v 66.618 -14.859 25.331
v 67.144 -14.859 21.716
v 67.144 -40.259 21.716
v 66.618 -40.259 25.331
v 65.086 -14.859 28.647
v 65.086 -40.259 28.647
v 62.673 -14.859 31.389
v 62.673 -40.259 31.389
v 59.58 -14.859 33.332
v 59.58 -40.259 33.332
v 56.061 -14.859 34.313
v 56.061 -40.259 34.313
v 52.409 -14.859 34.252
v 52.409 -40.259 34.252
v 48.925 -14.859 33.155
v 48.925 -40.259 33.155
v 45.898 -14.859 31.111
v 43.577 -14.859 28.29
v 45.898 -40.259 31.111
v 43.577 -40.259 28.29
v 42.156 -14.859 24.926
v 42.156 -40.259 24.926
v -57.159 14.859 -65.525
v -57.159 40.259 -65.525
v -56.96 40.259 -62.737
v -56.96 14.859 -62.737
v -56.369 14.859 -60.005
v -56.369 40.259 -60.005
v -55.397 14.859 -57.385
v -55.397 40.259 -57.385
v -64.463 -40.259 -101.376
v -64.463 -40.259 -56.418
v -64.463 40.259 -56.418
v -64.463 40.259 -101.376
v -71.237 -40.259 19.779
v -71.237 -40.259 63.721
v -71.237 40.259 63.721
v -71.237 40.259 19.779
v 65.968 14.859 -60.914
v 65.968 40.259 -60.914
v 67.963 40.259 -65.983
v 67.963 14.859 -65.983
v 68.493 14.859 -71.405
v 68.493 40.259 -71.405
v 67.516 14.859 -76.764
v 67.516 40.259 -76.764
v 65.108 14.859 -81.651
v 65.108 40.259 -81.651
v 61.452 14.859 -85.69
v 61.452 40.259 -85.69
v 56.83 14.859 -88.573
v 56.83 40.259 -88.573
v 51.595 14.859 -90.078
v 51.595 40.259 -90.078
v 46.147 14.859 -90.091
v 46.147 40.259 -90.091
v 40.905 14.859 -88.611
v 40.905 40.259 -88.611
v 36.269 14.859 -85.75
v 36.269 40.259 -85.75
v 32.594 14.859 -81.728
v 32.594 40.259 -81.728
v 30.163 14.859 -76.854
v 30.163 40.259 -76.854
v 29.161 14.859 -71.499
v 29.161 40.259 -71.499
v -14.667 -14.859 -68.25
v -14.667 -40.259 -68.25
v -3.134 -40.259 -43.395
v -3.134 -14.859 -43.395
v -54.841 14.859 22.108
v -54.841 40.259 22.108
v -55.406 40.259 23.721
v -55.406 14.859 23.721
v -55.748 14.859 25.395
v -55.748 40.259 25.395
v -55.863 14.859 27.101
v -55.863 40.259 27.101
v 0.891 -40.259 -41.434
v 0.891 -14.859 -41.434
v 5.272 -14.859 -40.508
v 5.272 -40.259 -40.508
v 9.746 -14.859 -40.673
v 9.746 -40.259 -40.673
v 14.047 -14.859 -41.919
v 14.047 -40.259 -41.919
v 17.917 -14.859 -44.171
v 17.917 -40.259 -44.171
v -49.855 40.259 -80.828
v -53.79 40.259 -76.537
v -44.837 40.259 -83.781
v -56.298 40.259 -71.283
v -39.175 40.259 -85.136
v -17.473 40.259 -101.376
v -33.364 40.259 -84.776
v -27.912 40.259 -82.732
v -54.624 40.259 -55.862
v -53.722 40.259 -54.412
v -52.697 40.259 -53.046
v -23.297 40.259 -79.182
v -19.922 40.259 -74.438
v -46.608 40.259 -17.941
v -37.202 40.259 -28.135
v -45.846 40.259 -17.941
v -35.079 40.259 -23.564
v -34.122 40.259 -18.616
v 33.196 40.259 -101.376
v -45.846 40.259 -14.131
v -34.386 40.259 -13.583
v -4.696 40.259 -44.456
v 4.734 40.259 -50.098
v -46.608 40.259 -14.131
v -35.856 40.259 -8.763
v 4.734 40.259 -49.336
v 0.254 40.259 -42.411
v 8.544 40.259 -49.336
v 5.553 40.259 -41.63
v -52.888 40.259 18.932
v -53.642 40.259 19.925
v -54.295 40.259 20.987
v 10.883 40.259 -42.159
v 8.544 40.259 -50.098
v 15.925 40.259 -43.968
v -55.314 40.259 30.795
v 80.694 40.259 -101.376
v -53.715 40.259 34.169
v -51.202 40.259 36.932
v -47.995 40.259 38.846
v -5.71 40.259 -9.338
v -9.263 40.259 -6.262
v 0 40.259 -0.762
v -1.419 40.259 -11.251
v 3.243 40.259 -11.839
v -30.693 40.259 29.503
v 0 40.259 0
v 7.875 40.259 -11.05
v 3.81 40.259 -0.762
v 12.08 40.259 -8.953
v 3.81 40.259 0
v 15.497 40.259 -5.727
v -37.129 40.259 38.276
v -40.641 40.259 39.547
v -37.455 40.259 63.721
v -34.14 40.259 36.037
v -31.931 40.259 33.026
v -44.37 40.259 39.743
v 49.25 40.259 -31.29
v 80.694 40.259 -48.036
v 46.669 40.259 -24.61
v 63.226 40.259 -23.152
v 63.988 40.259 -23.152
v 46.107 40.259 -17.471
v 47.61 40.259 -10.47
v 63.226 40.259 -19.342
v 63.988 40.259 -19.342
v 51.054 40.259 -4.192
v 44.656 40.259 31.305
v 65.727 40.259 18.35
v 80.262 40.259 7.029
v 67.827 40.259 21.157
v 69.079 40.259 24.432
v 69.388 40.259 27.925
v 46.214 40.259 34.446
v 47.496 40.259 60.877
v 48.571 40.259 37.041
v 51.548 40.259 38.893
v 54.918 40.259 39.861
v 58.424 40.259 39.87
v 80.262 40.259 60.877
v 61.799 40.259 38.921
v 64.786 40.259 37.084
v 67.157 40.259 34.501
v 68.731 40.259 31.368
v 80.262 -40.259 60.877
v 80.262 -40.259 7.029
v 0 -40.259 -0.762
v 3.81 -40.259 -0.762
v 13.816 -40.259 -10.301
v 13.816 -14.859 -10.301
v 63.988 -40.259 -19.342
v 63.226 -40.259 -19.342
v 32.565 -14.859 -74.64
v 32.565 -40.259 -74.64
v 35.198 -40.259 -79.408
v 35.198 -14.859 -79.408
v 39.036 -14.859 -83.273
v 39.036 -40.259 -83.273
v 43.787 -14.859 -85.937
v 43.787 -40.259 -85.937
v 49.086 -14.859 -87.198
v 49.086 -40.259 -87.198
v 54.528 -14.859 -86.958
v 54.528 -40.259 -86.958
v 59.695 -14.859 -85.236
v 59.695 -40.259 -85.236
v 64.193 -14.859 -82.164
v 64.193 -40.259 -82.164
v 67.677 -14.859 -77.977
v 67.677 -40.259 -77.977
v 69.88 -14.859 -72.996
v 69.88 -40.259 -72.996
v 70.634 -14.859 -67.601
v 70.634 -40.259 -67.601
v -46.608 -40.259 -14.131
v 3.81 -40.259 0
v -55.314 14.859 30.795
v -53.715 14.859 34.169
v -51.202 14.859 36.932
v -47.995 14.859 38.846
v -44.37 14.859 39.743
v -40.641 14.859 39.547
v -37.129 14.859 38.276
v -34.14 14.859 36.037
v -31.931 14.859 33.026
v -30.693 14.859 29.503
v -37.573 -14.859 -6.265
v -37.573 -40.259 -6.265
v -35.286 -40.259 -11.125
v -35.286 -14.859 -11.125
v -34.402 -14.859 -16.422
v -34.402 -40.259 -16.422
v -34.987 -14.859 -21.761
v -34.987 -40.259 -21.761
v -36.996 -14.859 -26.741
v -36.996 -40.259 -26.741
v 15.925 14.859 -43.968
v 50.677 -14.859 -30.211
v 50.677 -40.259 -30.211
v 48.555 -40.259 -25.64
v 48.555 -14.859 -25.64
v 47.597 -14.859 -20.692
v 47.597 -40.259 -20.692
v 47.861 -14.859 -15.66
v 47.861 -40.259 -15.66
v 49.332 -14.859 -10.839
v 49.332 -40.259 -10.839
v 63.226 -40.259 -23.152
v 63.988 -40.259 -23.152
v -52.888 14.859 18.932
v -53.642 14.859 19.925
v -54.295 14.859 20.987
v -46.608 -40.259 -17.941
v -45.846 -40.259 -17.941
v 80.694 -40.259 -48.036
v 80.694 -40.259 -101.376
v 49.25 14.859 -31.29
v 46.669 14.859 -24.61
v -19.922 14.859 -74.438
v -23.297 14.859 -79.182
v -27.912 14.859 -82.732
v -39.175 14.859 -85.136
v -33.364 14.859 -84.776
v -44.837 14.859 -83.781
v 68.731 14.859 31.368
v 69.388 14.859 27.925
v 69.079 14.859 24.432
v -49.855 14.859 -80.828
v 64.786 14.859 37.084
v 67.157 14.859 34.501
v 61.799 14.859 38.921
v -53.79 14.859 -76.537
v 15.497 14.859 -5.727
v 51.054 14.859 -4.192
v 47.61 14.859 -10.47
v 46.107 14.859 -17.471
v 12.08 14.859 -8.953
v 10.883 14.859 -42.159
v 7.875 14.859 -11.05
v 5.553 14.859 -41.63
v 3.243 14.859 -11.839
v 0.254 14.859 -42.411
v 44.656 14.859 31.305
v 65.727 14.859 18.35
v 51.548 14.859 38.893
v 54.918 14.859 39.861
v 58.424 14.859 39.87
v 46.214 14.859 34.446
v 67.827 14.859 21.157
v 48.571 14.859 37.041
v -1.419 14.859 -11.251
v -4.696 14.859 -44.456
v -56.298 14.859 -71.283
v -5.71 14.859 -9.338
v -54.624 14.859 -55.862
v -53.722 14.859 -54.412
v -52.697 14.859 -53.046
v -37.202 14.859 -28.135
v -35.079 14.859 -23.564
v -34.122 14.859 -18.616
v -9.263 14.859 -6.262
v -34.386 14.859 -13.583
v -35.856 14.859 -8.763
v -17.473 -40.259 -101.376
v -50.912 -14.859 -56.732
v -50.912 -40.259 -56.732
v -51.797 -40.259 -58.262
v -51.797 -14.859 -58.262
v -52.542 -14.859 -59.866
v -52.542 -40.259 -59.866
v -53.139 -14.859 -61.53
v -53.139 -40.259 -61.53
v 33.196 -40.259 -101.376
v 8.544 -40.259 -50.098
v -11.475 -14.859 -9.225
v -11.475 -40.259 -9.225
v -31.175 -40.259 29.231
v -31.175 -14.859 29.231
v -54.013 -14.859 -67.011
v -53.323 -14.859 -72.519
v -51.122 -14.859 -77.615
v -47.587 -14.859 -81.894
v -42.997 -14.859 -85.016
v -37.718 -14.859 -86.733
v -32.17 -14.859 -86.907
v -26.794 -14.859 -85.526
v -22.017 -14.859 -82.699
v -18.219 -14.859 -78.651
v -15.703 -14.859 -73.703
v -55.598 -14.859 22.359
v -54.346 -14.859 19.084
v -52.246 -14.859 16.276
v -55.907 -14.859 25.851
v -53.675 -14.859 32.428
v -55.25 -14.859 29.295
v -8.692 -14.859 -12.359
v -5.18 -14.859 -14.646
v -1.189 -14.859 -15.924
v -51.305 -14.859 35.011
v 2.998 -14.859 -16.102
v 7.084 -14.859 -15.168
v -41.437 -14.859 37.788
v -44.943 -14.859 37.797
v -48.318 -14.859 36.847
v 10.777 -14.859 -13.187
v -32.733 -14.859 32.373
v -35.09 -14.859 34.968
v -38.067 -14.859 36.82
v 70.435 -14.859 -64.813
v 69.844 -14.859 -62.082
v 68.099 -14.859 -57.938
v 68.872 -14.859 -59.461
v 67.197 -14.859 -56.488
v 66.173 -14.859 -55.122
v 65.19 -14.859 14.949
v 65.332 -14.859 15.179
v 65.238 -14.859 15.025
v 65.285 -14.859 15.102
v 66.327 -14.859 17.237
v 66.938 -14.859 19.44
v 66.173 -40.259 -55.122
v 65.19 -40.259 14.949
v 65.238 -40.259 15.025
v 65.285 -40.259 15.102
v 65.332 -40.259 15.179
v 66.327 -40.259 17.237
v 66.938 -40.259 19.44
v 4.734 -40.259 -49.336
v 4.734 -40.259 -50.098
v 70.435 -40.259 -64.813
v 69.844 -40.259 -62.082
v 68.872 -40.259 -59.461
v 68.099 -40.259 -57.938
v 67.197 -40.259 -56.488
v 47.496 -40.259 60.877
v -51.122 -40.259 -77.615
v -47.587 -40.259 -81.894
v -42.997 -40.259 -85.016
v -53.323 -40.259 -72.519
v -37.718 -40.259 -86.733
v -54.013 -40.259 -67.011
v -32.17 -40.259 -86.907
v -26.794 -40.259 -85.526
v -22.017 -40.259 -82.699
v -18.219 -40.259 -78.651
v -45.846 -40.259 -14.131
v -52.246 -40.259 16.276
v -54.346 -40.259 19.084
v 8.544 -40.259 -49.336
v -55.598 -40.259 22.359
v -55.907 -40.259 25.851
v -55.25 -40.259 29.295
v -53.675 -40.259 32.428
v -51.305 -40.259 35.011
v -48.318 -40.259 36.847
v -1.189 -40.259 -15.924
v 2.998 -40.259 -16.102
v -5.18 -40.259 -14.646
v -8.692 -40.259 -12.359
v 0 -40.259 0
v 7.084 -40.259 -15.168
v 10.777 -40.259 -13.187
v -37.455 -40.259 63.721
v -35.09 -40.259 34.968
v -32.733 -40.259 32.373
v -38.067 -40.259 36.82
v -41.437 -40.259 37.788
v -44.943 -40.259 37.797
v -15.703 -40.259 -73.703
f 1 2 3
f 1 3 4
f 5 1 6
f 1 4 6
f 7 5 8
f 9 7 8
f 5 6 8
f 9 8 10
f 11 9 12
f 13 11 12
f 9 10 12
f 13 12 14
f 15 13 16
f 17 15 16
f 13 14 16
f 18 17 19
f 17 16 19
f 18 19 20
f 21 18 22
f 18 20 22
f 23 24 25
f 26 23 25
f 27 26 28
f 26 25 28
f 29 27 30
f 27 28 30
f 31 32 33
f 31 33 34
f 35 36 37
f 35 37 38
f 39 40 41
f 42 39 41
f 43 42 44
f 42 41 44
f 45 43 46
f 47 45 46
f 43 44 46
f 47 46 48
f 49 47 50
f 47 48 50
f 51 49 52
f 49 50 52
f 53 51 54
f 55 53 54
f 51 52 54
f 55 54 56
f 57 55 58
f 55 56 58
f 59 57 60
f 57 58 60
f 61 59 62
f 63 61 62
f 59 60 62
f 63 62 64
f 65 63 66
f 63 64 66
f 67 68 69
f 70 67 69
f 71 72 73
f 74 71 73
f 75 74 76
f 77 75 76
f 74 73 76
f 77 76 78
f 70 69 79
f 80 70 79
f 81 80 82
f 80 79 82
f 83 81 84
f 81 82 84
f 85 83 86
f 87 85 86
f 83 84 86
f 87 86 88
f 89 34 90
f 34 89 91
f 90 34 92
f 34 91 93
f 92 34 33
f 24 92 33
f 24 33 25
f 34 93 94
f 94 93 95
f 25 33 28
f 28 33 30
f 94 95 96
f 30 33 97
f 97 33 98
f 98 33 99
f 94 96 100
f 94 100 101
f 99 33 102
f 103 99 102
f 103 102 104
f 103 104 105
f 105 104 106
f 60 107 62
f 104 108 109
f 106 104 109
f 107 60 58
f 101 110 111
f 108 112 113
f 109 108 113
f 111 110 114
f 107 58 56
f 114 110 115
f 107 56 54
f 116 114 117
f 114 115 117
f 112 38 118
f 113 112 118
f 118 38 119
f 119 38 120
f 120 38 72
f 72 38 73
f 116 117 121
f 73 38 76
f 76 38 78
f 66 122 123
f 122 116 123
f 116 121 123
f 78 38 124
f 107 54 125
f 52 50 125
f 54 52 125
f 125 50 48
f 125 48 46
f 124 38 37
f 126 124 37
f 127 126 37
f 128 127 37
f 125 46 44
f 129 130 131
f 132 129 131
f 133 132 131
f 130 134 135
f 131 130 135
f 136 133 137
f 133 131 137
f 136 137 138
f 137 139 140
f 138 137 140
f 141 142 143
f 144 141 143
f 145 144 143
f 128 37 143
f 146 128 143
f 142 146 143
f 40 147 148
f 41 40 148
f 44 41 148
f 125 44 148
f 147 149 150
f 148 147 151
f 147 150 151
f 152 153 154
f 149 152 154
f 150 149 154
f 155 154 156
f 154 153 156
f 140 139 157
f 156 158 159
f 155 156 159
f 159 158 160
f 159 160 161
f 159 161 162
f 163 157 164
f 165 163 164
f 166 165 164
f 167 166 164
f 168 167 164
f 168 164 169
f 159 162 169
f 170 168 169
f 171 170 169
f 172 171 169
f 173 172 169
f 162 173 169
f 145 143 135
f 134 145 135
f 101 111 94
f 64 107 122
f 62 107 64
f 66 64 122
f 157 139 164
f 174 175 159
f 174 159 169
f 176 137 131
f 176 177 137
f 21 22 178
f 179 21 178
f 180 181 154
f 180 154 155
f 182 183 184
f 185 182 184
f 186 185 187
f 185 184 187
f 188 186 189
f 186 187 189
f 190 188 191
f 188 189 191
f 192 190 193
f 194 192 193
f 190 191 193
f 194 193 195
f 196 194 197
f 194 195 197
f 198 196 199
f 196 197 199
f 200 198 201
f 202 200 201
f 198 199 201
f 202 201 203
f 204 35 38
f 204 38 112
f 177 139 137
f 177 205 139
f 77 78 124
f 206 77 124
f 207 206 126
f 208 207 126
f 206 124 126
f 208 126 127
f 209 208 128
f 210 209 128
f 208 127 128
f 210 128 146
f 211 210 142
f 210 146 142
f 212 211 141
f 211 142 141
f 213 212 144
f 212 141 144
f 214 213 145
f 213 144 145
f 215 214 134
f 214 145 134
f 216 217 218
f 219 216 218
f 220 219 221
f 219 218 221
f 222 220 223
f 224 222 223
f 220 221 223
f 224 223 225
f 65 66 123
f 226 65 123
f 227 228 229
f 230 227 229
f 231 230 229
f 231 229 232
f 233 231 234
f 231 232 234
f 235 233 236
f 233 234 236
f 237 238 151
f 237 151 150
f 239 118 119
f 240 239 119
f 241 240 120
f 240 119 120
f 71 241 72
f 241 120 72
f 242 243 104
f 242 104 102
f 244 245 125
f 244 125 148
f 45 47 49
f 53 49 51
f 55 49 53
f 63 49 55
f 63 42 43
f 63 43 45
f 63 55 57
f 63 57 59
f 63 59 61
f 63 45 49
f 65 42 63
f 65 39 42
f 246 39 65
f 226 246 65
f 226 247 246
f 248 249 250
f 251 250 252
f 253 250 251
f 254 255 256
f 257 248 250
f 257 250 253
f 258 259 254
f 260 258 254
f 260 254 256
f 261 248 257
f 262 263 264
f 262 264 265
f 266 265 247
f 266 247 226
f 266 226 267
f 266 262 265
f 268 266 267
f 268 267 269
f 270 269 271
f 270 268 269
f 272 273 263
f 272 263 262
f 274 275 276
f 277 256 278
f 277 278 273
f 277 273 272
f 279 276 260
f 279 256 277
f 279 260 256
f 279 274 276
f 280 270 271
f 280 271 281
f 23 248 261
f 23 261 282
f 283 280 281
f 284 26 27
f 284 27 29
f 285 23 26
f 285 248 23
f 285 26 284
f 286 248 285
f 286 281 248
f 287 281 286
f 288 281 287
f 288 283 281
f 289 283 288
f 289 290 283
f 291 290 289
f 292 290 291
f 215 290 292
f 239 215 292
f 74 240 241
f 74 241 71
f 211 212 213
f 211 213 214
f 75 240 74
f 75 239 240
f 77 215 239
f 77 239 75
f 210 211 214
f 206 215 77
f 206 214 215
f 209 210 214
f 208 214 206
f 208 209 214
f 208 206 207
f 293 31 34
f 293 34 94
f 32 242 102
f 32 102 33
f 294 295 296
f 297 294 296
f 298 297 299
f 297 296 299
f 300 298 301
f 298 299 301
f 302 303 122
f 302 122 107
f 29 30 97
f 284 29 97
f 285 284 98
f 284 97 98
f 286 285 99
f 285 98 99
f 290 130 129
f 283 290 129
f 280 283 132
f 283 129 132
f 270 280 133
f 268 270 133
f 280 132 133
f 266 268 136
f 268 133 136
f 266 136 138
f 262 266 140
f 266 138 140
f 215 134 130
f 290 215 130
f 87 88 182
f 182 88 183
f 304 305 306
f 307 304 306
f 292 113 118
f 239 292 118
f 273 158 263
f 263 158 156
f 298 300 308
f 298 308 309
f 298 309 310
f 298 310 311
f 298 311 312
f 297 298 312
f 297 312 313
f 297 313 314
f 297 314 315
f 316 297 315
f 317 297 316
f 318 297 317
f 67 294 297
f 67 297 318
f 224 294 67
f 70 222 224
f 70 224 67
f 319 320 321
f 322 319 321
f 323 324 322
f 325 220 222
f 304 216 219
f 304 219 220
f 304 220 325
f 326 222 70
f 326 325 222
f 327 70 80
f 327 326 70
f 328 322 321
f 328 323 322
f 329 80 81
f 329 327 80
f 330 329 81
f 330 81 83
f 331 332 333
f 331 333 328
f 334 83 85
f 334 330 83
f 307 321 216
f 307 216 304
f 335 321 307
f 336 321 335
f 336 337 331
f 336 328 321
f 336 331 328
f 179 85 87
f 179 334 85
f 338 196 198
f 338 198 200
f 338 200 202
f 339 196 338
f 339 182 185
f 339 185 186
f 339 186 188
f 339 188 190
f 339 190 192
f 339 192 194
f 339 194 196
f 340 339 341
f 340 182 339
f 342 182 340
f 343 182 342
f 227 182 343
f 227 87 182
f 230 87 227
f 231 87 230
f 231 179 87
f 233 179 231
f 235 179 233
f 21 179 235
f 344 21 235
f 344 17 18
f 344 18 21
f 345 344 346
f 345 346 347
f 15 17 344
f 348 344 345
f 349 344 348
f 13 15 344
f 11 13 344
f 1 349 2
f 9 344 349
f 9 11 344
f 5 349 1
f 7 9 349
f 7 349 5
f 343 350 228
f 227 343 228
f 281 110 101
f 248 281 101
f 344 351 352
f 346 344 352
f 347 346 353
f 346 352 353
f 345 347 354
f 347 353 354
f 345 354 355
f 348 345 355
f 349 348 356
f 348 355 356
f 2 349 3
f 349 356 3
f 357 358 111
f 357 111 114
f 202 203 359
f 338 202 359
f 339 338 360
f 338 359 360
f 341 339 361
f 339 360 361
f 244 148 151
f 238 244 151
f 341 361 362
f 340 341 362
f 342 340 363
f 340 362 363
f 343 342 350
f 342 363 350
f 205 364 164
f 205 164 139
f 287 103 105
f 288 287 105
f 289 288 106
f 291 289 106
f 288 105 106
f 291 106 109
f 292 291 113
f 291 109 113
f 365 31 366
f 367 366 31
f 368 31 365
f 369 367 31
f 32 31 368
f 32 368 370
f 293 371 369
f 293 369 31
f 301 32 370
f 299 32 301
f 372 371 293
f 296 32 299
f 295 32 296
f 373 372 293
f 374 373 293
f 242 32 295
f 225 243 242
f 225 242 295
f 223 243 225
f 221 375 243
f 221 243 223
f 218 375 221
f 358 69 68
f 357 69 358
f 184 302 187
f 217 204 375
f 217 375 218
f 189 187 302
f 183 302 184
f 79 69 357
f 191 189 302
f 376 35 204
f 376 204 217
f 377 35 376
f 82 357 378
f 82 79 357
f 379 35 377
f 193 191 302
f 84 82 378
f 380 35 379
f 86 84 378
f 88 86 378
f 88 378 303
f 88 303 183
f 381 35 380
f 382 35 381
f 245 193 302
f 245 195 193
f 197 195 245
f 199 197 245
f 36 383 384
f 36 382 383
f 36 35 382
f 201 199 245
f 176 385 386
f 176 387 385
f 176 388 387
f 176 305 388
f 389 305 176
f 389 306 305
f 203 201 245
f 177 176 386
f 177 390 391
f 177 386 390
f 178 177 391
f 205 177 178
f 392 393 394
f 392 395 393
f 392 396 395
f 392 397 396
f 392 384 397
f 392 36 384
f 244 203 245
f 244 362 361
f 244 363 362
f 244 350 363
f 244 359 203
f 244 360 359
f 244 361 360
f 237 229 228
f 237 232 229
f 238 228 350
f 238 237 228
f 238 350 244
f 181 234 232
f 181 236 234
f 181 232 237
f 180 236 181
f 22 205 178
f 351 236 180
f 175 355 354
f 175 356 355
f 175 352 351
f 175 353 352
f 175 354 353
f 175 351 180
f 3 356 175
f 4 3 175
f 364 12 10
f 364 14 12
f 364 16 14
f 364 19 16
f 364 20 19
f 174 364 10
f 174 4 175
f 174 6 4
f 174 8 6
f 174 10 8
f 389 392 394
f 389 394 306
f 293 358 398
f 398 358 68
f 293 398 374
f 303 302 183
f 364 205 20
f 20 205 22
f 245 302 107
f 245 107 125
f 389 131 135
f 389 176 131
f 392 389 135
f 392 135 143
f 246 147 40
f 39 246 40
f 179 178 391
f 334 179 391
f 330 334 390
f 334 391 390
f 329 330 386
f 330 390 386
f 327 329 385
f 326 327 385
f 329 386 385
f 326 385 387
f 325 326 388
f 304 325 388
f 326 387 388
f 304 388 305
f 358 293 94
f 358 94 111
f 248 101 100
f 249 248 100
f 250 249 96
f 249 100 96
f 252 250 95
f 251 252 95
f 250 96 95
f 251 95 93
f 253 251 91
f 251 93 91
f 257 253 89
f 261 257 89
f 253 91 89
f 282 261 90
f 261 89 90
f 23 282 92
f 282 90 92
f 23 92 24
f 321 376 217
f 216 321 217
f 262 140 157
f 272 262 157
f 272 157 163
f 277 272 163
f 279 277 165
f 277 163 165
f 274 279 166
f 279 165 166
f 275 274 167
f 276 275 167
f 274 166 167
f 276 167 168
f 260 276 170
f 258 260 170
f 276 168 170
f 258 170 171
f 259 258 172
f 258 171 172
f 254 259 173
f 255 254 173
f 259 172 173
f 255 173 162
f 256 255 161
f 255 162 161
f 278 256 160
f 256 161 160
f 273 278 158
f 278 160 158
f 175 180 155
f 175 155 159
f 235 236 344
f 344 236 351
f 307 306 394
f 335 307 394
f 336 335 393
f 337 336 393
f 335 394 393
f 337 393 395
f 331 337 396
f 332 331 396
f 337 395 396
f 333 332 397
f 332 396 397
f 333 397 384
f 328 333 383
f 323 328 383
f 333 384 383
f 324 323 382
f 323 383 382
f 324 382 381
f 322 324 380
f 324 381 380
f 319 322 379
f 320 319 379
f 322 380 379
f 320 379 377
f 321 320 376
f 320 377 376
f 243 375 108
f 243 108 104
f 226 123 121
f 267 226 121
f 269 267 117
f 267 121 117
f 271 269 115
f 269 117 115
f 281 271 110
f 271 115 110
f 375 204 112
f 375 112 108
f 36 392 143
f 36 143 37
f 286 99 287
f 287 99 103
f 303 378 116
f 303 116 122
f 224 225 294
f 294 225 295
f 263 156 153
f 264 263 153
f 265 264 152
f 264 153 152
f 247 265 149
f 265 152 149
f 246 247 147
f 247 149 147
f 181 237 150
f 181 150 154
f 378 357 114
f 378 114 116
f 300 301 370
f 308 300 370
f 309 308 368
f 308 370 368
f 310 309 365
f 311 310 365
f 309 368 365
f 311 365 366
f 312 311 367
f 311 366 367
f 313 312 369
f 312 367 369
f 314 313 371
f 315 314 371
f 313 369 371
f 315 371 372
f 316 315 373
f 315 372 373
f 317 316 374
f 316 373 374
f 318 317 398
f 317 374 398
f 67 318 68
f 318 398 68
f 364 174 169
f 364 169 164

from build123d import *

# Parameters (mm, degrees)
F1_DEPTH = 40.259
F3_DEPTH = 25.4
F5_DEPTH = 25.4


with BuildPart() as f1:
    # F0 (on Front) → F1 (new body, symmetric)
    with BuildSketch(Plane.XZ):
        Polygon((0, -0.762), (0, 0), (-37.454836, 63.721383), (-71.236836, 63.721383), (-71.236836, 19.779383), (-46.608452, -14.130657), (-45.846452, -14.130657), (-45.846452, -17.940657), (-46.608452, -17.940657), (-64.46274, -56.418067), (-64.46274, -101.376067), (-17.47274, -101.376067), (4.734051, -50.098072), (4.734051, -49.336072), (8.544051, -49.336072), (8.544051, -50.098072), (33.19607, -101.376067), (80.69407, -101.376067), (80.69407, -48.036067), (63.988247, -23.151609), (63.226247, -23.151609), (63.226247, -19.341609), (63.988247, -19.341609), (80.262104, 7.029165), (80.262104, 60.877165), (47.496104, 60.877165), (3.81, 0), (3.81, -0.762), align=None)
    extrude(amount=F1_DEPTH, both=True)

    # F2 (on face) → F3 (cut)
    with BuildSketch(Plane.XZ.offset(40.259)):
        with BuildLine():
            ThreePointArc((-52.245846, 16.276482), (-38.390892, 13.469409), (-30.523199, 25.214145))
            ThreePointArc((-30.523199, 25.214145), (-30.687283, 27.249046), (-31.175296, 29.231365))
            ThreePointArc((-31.175296, 29.231365), (-49.874912, 36.032865), (-52.245846, 16.276482))
        make_face()
        with BuildLine():
            ThreePointArc((-31.175296, 29.231365), (-30.687283, 27.249046), (-30.523199, 25.214145))
            ThreePointArc((-30.523199, 25.214145), (-38.390892, 13.469409), (-52.245846, 16.276482))
            Line((-52.245846, 16.276482), (-37.573051, -6.265247))
            ThreePointArc((-37.573051, -6.265247), (-34.402313, -16.422015), (-36.996162, -26.741195))
            Line((-36.996162, -26.741195), (-50.912392, -56.731777))
            ThreePointArc((-50.912392, -56.731777), (-28.804068, -48.448298), (-14.646231, -67.34141))
            ThreePointArc((-14.646231, -67.34141), (-14.651472, -67.795631), (-14.667193, -68.249609))
            Line((-14.667193, -68.249609), (-3.134057, -43.394785))
            ThreePointArc((-3.134057, -43.394785), (7.514222, -40.45337), (17.917042, -44.17078))
            Line((17.917042, -44.17078), (32.565061, -74.639729))
            ThreePointArc((32.565061, -74.639729), (41.062727, -50.578546), (66.172654, -55.121942))
            Line((66.172654, -55.121942), (50.676871, -30.211112))
            ThreePointArc((50.676871, -30.211112), (47.597224, -20.692297), (49.331598, -10.839176))
            Line((49.331598, -10.839176), (65.190411, 14.949097))
            ThreePointArc((65.190411, 14.949097), (49.396243, 10.062519), (42.155779, 24.925563))
            Line((42.155779, 24.925563), (13.816384, -10.301067))
            ThreePointArc((13.816384, -10.301067), (0.898878, -16.153519), (-11.474751, -9.224849))
            Line((-11.474751, -9.224849), (-31.175296, 29.231365))
        make_face()
        with BuildLine():
            ThreePointArc((67.143639, 21.716436), (56.06138, 34.31298), (42.155779, 24.925563))
            ThreePointArc((42.155779, 24.925563), (49.396243, 10.062519), (65.190411, 14.949097))
            Line((65.190411, 14.949097), (65.331844, 15.179083))
            ThreePointArc((65.331844, 15.179083), (66.682311, 18.324549), (67.143639, 21.716436))
        make_face()
        with BuildLine():
            Line((-53.138839, -61.529947), (-50.912392, -56.731777))
            ThreePointArc((-50.912392, -56.731777), (-52.187514, -59.055738), (-53.138839, -61.529947))
        make_face()
        with BuildLine():
            ThreePointArc((-14.646231, -67.34141), (-28.804068, -48.448298), (-50.912392, -56.731777))
            Line((-50.912392, -56.731777), (-53.138839, -61.529947))
            ThreePointArc((-53.138839, -61.529947), (-37.718241, -86.732836), (-14.667193, -68.249609))
            ThreePointArc((-14.667193, -68.249609), (-14.651472, -67.795631), (-14.646231, -67.34141))
        make_face()
        with BuildLine():
            Line((65.331844, 15.179083), (65.190411, 14.949097))
            ThreePointArc((65.190411, 14.949097), (65.261739, 15.063714), (65.331844, 15.179083))
        make_face()
        with BuildLine():
            Line((68.871818, -59.461086), (66.172654, -55.121942))
            ThreePointArc((66.172654, -55.121942), (41.062727, -50.578546), (32.565061, -74.639729))
            ThreePointArc((32.565061, -74.639729), (54.527629, -86.95802), (70.633667, -67.601103))
            ThreePointArc((70.633667, -67.601103), (70.188163, -63.43685), (68.871818, -59.461086))
        make_face()
        with BuildLine():
            ThreePointArc((68.871818, -59.461086), (67.663637, -57.203555), (66.172654, -55.121942))
            Line((66.172654, -55.121942), (68.871818, -59.461086))
        make_face()
    extrude(amount=-F3_DEPTH, mode=Mode.SUBTRACT)

    # F4 (on face) → F5 (cut)
    with BuildSketch(Plane(origin=(0, 40.259, 0), x_dir=(-1, 0, 0), z_dir=(0, 1, 0))):
        with BuildLine():
            ThreePointArc((-65.726989, 18.3497), (-51.872034, 15.542628), (-44.004341, 27.287363))
            ThreePointArc((-44.004341, 27.287363), (-44.168425, 29.322264), (-44.656439, 31.304583))
            ThreePointArc((-44.656439, 31.304583), (-63.356054, 38.106083), (-65.726989, 18.3497))
        make_face()
        with BuildLine():
            ThreePointArc((-44.656439, 31.304583), (-44.168425, 29.322264), (-44.004341, 27.287363))
            ThreePointArc((-44.004341, 27.287363), (-51.872034, 15.542628), (-65.726989, 18.3497))
            Line((-65.726989, 18.3497), (-51.054193, -4.192029))
            ThreePointArc((-51.054193, -4.192029), (-46.106839, -17.471409), (-49.249755, -31.289525))
            Line((-49.249755, -31.289525), (-65.967989, -60.914299))
            ThreePointArc((-65.967989, -60.914299), (-43.823018, -51.54992), (-29.139468, -70.588952))
            ThreePointArc((-29.139468, -70.588952), (-29.144731, -71.044099), (-29.160516, -71.499002))
            Line((-29.160516, -71.499002), (-15.92485, -43.967853))
            ThreePointArc((-15.92485, -43.967853), (-5.553349, -41.629648), (4.695866, -44.456098))
            Line((4.695866, -44.456098), (19.922124, -74.438221))
            ThreePointArc((19.922124, -74.438221), (26.714122, -49.040464), (52.697492, -53.045686))
            Line((52.697492, -53.045686), (37.20171, -28.134856))
            ThreePointArc((37.20171, -28.134856), (34.122063, -18.616042), (35.856437, -8.762921))
            Line((35.856437, -8.762921), (52.887628, 18.931776))
            ThreePointArc((52.887628, 18.931776), (37.702376, 15.634645), (30.692658, 29.502839))
            Line((30.692658, 29.502839), (9.262503, -6.26221))
            ThreePointArc((9.262503, -6.26221), (-3.243304, -11.839034), (-15.496504, -5.727138))
            Line((-15.496504, -5.727138), (-44.656439, 31.304583))
        make_face()
        with BuildLine():
            ThreePointArc((55.863387, 27.100566), (44.369981, 39.743119), (30.692658, 29.502839))
            ThreePointArc((30.692658, 29.502839), (37.702376, 15.634645), (52.887628, 18.931776))
            Line((52.887628, 18.931776), (54.840929, 22.10807))
            ThreePointArc((54.840929, 22.10807), (55.605147, 24.552506), (55.863387, 27.100566))
        make_face()
        with BuildLine():
            ThreePointArc((-29.139468, -70.588952), (-43.823018, -51.54992), (-65.967989, -60.914299))
            ThreePointArc((-65.967989, -60.914299), (-54.264793, -89.507252), (-29.160516, -71.499002))
            ThreePointArc((-29.160516, -71.499002), (-29.144731, -71.044099), (-29.139468, -70.588952))
        make_face()
        with BuildLine():
            Line((54.840929, 22.10807), (52.887628, 18.931776))
            ThreePointArc((52.887628, 18.931776), (53.981487, 20.447844), (54.840929, 22.10807))
        make_face()
        with BuildLine():
            Line((55.396657, -57.38483), (52.697492, -53.045686))
            ThreePointArc((52.697492, -53.045686), (26.714122, -49.040464), (19.922124, -74.438221))
            ThreePointArc((19.922124, -74.438221), (42.056096, -84.669013), (57.158505, -65.524847))
            ThreePointArc((57.158505, -65.524847), (56.713002, -61.360595), (55.396657, -57.38483))
        make_face()
        with BuildLine():
            ThreePointArc((55.396657, -57.38483), (54.188476, -55.1273), (52.697492, -53.045686))
            Line((52.697492, -53.045686), (55.396657, -57.38483))
        make_face()
    extrude(amount=-F5_DEPTH, mode=Mode.SUBTRACT)


solid = f1.part
